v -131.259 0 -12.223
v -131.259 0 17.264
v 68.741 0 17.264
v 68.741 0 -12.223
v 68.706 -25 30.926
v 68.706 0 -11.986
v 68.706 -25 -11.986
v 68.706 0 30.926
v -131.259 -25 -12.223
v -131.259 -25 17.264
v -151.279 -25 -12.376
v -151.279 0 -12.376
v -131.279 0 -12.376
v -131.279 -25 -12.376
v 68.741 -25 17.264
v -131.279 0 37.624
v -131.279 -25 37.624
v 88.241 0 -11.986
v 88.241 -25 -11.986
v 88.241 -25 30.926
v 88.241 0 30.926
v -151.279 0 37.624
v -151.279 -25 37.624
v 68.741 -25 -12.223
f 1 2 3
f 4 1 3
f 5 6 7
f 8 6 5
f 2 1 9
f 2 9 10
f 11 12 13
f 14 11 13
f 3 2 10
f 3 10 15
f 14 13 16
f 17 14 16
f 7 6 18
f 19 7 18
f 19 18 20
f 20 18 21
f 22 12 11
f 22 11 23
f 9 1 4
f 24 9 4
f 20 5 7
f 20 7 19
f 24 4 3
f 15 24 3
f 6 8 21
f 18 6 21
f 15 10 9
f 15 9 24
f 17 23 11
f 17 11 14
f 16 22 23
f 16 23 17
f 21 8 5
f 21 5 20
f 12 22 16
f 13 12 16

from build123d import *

# Parameters (mm, degrees)
F0_W     = 20
F0_H     = 50
F3_DEPTH = 25
F1_W     = 200
F1_H     = 29.4873276725
F2_W     = 19.5345133543
F2_H     = 42.9117744789


with BuildPart() as f3:
    # F0 (on Front) → F3 (new body)
    with BuildSketch(Plane.XZ):
        with Locations((-141.2794581467, 12.6236931145)):
            Rectangle(F0_W, F0_H)
    extrude(amount=F3_DEPTH)


with BuildPart() as f3b:
    # F1 (on Front) → F3, piece 2 (new body)
    with BuildSketch(Plane.XZ):
        with Locations((-31.2591433525, 2.5208140723)):
            Rectangle(F1_W, F1_H)
    extrude(amount=F3_DEPTH)


with BuildPart() as f3c:
    # F2 (on Front) → F3, piece 3 (new body)
    with BuildSketch(Plane.XZ):
        with Locations((78.4732475877, 9.4696381129)):
            Rectangle(F2_W, F2_H)
    extrude(amount=F3_DEPTH)


solid = Compound([f3.part, f3b.part, f3c.part])
